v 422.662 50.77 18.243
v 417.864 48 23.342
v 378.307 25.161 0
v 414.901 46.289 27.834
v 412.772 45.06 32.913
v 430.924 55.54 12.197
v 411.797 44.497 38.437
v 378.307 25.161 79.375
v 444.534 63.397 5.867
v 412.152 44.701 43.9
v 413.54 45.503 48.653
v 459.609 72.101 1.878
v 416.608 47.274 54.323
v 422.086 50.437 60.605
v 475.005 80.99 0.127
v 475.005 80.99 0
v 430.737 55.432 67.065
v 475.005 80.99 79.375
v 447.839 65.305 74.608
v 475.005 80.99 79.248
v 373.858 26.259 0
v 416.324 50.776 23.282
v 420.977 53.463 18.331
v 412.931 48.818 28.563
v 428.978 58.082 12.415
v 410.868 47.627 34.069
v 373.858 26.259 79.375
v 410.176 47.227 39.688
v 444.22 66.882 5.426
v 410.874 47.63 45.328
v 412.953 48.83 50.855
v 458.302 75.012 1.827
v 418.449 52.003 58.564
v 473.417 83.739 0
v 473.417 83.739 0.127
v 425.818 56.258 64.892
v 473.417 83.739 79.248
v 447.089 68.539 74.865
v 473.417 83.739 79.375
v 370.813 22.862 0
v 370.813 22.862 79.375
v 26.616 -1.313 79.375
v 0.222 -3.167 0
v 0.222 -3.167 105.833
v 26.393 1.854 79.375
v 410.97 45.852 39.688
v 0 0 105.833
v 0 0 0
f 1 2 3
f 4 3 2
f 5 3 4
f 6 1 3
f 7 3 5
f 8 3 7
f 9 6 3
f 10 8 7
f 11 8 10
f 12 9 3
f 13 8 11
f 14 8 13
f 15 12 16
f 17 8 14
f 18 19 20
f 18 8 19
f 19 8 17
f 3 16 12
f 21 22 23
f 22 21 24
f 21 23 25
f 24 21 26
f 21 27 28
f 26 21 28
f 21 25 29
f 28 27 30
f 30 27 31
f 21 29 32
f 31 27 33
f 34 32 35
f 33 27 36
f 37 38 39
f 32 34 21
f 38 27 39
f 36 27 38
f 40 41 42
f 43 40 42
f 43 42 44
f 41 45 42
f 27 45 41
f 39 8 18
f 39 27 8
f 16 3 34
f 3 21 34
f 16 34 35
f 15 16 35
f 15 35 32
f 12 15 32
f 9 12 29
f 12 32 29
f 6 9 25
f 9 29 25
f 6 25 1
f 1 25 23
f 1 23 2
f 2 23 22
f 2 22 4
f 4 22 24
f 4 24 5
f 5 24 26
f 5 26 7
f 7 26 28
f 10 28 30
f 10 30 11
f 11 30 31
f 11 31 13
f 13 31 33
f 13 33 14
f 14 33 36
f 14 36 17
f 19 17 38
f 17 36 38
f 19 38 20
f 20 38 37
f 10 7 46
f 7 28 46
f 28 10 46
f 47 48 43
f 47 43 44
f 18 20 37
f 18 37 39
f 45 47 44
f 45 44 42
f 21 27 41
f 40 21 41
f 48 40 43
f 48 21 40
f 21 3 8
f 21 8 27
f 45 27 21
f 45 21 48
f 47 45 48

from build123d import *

# Parameters (mm, degrees)
F3_DEPTH  = 3.175
F5_W      = 121.3115097417
F5_H      = 79.375
F6_DEPTH  = 3.175
F9_DEPTH  = 508
F12_DEPTH = 127
F14_W     = 22.6193475891
F14_H     = 102.4130078614
F15_DEPTH = 78.8076154867
F17_DEPTH = 76.0579848297


with BuildPart() as f3:
    # F2 (on line) → F3 (new body)
    with BuildSketch(Plane(origin=(0, 0, 0), x_dir=(-0.9975424899, -0.0700641192, 0), z_dir=(-0.0700641192, 0.9975424899, 0))):
        Polygon((-374.7787855402, 79.375), (-374.7787855402, 0), (0, 0), (0, 105.8333333333), (-26.4583333333, 79.375), align=None)
    extrude(amount=-F3_DEPTH)


with BuildPart() as f6:
    # F5 (on line) → F6 (new body)
    with BuildSketch(Plane(origin=(82.0941569891, -142.1912509096, 0), x_dir=(0.8660254038, 0.5, 0), z_dir=(0.5, -0.8660254038, 0))):
        with Locations((397.5553476934, 39.6875)):
            Rectangle(F5_W, F5_H)
    extrude(amount=F6_DEPTH)


with BuildPart() as f9_tool:
    # F8 (on offset) → F9 (new body)
    with BuildSketch(Plane.XY.offset(104.775)):
        Polygon((374.0802164765, 23.0913480962), (375.4452628981, 23.5089148446), (378.3071328128, 25.1612162103), (373.8577628981, 26.2585455017), (370.8132995806, 22.8618905471), (373.1291867382, 23.0245508804), align=None)
    extrude(amount=-F9_DEPTH)


with BuildPart() as f3_1:
    add(f3.part)

    # F9: cut by f9_tool
    add(f9_tool.part, mode=Mode.SUBTRACT)


with BuildPart() as f6_1:
    add(f6.part)

    # F9: cut by f9_tool
    add(f9_tool.part, mode=Mode.SUBTRACT)

    # F11 (on face) → F12 (cut, symmetric)
    with BuildSketch(Plane(origin=(478.9166121058, 0, 0), x_dir=(0, -1, 0), z_dir=(-1, 0, 0))):
        with BuildLine():
            ThreePointArc((-47.2268003725, 39.6875), (-58.8509999942, 67.7508003783), (-86.9143003725, 79.375))
            Line((-86.9143003725, 79.375), (-86.9143003725, 0))
            ThreePointArc((-86.9143003725, 0), (-58.8509999942, 11.6241996217), (-47.2268003725, 39.6875))
        make_face()
        with BuildLine():
            Line((-86.9143003725, 0), (-86.9143003725, 79.375))
            ThreePointArc((-86.9143003725, 79.375), (-126.6018003725, 39.6875), (-86.9143003725, 0))
        make_face()
    extrude(amount=F12_DEPTH, both=True, mode=Mode.SUBTRACT)

    # F14 (on offset) → F15 (cut, through all)
    with BuildSketch(Plane(origin=(82.0941569891, -142.1912509096, 0), x_dir=(-0.8660254038, -0.5, 0), z_dir=(-0.5, 0.8660254038, 0))):
        with Locations((-463.1707763588, 34.5184960693)):
            Rectangle(F14_W, F14_H)
    extrude(amount=-F15_DEPTH, mode=Mode.SUBTRACT)

    # F16 (on offset) → F17 (cut, through all)
    with BuildSketch(Plane(origin=(82.0941569891, -142.1912509096, 0), x_dir=(-0.8660254038, -0.5, 0), z_dir=(-0.5, 0.8660254038, 0))):
        with BuildLine():
            Line((-465.6792283058, 0.1272038529), (-451.8611025642, 0.1272038529))
            add(Edge.make_bspline(
                [(-451.8611025642, 0.1272038529), (-378.8361025642, 3.05759616), (-378.8361025642, 39.6875), (-378.8361025642, 76.31740384), (-451.8611025642, 79.2477961471)],
                knots=[1.6508819068, 1.6508819068, 1.6508819068, 3.1415926536, 3.1415926536, 4.6323034004, 4.6323034004, 4.6323034004], degree=2, weights=[1, 0.7348469228, 1, 0.7348469228, 1]))
            Line((-451.8611025642, 79.2477961471), (-465.6792283058, 79.2477961471))
            Line((-465.6792283058, 79.2477961471), (-465.6792283058, 0.1272038529))
        make_face()
    extrude(amount=-F17_DEPTH, mode=Mode.SUBTRACT)


solid = Compound([f3_1.part, f6_1.part])
